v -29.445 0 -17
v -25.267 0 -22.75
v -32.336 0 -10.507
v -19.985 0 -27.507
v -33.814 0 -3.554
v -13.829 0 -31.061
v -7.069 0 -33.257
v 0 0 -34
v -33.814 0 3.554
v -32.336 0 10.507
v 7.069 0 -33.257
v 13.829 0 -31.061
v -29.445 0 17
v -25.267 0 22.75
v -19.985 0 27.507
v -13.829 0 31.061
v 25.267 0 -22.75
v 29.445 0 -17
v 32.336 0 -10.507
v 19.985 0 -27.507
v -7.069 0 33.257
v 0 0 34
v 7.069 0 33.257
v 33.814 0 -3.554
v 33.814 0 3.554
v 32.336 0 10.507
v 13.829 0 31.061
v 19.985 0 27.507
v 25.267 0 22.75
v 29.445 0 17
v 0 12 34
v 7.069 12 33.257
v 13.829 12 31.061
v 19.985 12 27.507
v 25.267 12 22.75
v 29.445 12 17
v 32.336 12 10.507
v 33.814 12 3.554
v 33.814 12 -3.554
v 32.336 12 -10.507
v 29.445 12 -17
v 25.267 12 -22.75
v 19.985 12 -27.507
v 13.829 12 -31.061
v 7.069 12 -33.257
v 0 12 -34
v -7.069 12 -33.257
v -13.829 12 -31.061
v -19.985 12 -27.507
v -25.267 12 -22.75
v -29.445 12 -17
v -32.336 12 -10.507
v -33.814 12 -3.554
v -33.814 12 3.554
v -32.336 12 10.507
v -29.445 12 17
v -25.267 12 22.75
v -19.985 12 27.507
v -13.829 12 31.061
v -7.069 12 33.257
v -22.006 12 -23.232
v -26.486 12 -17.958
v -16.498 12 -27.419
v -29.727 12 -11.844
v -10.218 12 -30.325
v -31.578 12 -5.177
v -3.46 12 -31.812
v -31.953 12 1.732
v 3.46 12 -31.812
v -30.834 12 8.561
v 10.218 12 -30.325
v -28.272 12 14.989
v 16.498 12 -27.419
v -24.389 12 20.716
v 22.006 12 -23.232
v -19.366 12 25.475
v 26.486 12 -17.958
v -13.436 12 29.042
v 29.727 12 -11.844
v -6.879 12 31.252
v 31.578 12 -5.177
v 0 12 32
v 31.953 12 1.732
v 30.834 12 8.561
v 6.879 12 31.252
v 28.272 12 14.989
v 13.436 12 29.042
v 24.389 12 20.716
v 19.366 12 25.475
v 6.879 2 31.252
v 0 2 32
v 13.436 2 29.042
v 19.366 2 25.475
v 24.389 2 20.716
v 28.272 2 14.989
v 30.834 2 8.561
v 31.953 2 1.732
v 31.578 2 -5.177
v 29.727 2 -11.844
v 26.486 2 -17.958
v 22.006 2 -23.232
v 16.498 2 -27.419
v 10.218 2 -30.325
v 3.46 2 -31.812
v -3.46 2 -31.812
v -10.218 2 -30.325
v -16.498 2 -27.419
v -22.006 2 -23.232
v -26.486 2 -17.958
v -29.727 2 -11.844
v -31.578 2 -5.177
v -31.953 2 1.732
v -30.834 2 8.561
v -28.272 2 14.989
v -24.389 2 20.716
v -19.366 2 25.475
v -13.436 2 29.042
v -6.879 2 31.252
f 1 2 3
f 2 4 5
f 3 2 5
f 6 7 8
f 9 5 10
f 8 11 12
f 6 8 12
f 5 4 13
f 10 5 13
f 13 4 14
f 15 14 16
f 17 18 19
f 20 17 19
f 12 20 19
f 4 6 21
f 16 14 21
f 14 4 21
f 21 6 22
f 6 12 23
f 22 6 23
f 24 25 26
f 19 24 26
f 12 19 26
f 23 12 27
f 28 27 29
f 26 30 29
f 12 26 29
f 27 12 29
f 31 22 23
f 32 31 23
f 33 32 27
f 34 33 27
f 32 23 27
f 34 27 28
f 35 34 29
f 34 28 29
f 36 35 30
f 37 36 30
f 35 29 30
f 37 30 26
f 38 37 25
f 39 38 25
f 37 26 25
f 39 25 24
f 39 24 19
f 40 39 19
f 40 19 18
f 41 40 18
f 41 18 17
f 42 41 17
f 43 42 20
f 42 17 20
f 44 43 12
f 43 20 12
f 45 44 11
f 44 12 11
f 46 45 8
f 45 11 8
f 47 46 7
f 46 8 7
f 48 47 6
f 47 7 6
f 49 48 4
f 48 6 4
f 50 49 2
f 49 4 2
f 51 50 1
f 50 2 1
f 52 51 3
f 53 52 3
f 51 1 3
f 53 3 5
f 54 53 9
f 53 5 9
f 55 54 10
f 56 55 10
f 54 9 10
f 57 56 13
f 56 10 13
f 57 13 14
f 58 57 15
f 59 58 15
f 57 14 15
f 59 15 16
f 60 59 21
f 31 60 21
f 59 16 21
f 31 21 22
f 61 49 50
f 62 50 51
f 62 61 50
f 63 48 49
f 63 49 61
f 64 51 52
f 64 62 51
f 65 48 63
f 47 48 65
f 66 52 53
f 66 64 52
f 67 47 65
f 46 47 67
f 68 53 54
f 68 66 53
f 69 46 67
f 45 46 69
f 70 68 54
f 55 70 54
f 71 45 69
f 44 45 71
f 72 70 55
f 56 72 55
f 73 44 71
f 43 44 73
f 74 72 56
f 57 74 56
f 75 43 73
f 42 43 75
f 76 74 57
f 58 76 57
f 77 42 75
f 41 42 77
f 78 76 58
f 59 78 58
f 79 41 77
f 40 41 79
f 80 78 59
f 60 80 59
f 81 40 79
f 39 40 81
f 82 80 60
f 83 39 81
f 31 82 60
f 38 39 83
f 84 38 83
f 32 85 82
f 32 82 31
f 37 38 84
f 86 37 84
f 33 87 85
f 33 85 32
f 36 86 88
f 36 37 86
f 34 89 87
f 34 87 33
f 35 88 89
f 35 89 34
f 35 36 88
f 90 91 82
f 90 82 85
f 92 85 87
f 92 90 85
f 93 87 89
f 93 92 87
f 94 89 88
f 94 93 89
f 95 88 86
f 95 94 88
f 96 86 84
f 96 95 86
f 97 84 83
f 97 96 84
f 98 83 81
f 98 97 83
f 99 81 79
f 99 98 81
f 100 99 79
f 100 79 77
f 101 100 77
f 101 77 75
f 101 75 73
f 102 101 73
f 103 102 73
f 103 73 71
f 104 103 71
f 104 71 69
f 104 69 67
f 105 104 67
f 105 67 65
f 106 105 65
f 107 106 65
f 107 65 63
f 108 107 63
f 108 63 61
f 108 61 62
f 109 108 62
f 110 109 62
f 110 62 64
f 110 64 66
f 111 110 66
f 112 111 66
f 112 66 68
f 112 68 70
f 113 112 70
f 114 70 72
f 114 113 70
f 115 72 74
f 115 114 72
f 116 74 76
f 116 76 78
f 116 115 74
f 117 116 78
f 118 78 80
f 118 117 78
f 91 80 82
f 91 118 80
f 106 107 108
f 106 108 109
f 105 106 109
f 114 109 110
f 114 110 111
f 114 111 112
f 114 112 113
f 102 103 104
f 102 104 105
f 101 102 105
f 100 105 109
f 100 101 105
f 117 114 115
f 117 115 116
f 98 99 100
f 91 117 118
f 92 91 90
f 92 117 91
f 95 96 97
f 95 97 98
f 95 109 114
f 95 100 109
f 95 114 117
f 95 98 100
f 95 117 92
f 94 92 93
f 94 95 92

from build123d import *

# Parameters (mm, degrees)
SKETCH1_R           = 34
SKETCH1_R_2         = 32
BOSS_EXTRUDE1_DEPTH = 12
SKETCH1_2_R         = 34
SKETCH1_2_R_2       = 32
BOSS_EXTRUDE2_DEPTH = 12
SKETCH1_3_R         = 32
BOSS_EXTRUDE3_DEPTH = 2


with BuildPart() as part:
    # Sketch1 → Boss-Extrude1 (new body)
    with BuildSketch(Plane(origin=(0, 0, 0), x_dir=(1, 0, 0), z_dir=(0, 1, 0))):
        Circle(SKETCH1_R)
        Circle(SKETCH1_R_2, mode=Mode.SUBTRACT)
    extrude(amount=BOSS_EXTRUDE1_DEPTH)

    # Sketch1<2> → Boss-Extrude2 (add)
    with BuildSketch(Plane(origin=(0, 0, 0), x_dir=(1, 0, 0), z_dir=(0, 1, 0))):
        Circle(SKETCH1_2_R)
        Circle(SKETCH1_2_R_2, mode=Mode.SUBTRACT)
    extrude(amount=BOSS_EXTRUDE2_DEPTH)

    # Sketch1<3> → Boss-Extrude3 (add)
    with BuildSketch(Plane(origin=(0, 0, 0), x_dir=(1, 0, 0), z_dir=(0, 1, 0))):
        Circle(SKETCH1_3_R)
    extrude(amount=BOSS_EXTRUDE3_DEPTH)


solid = part.part
